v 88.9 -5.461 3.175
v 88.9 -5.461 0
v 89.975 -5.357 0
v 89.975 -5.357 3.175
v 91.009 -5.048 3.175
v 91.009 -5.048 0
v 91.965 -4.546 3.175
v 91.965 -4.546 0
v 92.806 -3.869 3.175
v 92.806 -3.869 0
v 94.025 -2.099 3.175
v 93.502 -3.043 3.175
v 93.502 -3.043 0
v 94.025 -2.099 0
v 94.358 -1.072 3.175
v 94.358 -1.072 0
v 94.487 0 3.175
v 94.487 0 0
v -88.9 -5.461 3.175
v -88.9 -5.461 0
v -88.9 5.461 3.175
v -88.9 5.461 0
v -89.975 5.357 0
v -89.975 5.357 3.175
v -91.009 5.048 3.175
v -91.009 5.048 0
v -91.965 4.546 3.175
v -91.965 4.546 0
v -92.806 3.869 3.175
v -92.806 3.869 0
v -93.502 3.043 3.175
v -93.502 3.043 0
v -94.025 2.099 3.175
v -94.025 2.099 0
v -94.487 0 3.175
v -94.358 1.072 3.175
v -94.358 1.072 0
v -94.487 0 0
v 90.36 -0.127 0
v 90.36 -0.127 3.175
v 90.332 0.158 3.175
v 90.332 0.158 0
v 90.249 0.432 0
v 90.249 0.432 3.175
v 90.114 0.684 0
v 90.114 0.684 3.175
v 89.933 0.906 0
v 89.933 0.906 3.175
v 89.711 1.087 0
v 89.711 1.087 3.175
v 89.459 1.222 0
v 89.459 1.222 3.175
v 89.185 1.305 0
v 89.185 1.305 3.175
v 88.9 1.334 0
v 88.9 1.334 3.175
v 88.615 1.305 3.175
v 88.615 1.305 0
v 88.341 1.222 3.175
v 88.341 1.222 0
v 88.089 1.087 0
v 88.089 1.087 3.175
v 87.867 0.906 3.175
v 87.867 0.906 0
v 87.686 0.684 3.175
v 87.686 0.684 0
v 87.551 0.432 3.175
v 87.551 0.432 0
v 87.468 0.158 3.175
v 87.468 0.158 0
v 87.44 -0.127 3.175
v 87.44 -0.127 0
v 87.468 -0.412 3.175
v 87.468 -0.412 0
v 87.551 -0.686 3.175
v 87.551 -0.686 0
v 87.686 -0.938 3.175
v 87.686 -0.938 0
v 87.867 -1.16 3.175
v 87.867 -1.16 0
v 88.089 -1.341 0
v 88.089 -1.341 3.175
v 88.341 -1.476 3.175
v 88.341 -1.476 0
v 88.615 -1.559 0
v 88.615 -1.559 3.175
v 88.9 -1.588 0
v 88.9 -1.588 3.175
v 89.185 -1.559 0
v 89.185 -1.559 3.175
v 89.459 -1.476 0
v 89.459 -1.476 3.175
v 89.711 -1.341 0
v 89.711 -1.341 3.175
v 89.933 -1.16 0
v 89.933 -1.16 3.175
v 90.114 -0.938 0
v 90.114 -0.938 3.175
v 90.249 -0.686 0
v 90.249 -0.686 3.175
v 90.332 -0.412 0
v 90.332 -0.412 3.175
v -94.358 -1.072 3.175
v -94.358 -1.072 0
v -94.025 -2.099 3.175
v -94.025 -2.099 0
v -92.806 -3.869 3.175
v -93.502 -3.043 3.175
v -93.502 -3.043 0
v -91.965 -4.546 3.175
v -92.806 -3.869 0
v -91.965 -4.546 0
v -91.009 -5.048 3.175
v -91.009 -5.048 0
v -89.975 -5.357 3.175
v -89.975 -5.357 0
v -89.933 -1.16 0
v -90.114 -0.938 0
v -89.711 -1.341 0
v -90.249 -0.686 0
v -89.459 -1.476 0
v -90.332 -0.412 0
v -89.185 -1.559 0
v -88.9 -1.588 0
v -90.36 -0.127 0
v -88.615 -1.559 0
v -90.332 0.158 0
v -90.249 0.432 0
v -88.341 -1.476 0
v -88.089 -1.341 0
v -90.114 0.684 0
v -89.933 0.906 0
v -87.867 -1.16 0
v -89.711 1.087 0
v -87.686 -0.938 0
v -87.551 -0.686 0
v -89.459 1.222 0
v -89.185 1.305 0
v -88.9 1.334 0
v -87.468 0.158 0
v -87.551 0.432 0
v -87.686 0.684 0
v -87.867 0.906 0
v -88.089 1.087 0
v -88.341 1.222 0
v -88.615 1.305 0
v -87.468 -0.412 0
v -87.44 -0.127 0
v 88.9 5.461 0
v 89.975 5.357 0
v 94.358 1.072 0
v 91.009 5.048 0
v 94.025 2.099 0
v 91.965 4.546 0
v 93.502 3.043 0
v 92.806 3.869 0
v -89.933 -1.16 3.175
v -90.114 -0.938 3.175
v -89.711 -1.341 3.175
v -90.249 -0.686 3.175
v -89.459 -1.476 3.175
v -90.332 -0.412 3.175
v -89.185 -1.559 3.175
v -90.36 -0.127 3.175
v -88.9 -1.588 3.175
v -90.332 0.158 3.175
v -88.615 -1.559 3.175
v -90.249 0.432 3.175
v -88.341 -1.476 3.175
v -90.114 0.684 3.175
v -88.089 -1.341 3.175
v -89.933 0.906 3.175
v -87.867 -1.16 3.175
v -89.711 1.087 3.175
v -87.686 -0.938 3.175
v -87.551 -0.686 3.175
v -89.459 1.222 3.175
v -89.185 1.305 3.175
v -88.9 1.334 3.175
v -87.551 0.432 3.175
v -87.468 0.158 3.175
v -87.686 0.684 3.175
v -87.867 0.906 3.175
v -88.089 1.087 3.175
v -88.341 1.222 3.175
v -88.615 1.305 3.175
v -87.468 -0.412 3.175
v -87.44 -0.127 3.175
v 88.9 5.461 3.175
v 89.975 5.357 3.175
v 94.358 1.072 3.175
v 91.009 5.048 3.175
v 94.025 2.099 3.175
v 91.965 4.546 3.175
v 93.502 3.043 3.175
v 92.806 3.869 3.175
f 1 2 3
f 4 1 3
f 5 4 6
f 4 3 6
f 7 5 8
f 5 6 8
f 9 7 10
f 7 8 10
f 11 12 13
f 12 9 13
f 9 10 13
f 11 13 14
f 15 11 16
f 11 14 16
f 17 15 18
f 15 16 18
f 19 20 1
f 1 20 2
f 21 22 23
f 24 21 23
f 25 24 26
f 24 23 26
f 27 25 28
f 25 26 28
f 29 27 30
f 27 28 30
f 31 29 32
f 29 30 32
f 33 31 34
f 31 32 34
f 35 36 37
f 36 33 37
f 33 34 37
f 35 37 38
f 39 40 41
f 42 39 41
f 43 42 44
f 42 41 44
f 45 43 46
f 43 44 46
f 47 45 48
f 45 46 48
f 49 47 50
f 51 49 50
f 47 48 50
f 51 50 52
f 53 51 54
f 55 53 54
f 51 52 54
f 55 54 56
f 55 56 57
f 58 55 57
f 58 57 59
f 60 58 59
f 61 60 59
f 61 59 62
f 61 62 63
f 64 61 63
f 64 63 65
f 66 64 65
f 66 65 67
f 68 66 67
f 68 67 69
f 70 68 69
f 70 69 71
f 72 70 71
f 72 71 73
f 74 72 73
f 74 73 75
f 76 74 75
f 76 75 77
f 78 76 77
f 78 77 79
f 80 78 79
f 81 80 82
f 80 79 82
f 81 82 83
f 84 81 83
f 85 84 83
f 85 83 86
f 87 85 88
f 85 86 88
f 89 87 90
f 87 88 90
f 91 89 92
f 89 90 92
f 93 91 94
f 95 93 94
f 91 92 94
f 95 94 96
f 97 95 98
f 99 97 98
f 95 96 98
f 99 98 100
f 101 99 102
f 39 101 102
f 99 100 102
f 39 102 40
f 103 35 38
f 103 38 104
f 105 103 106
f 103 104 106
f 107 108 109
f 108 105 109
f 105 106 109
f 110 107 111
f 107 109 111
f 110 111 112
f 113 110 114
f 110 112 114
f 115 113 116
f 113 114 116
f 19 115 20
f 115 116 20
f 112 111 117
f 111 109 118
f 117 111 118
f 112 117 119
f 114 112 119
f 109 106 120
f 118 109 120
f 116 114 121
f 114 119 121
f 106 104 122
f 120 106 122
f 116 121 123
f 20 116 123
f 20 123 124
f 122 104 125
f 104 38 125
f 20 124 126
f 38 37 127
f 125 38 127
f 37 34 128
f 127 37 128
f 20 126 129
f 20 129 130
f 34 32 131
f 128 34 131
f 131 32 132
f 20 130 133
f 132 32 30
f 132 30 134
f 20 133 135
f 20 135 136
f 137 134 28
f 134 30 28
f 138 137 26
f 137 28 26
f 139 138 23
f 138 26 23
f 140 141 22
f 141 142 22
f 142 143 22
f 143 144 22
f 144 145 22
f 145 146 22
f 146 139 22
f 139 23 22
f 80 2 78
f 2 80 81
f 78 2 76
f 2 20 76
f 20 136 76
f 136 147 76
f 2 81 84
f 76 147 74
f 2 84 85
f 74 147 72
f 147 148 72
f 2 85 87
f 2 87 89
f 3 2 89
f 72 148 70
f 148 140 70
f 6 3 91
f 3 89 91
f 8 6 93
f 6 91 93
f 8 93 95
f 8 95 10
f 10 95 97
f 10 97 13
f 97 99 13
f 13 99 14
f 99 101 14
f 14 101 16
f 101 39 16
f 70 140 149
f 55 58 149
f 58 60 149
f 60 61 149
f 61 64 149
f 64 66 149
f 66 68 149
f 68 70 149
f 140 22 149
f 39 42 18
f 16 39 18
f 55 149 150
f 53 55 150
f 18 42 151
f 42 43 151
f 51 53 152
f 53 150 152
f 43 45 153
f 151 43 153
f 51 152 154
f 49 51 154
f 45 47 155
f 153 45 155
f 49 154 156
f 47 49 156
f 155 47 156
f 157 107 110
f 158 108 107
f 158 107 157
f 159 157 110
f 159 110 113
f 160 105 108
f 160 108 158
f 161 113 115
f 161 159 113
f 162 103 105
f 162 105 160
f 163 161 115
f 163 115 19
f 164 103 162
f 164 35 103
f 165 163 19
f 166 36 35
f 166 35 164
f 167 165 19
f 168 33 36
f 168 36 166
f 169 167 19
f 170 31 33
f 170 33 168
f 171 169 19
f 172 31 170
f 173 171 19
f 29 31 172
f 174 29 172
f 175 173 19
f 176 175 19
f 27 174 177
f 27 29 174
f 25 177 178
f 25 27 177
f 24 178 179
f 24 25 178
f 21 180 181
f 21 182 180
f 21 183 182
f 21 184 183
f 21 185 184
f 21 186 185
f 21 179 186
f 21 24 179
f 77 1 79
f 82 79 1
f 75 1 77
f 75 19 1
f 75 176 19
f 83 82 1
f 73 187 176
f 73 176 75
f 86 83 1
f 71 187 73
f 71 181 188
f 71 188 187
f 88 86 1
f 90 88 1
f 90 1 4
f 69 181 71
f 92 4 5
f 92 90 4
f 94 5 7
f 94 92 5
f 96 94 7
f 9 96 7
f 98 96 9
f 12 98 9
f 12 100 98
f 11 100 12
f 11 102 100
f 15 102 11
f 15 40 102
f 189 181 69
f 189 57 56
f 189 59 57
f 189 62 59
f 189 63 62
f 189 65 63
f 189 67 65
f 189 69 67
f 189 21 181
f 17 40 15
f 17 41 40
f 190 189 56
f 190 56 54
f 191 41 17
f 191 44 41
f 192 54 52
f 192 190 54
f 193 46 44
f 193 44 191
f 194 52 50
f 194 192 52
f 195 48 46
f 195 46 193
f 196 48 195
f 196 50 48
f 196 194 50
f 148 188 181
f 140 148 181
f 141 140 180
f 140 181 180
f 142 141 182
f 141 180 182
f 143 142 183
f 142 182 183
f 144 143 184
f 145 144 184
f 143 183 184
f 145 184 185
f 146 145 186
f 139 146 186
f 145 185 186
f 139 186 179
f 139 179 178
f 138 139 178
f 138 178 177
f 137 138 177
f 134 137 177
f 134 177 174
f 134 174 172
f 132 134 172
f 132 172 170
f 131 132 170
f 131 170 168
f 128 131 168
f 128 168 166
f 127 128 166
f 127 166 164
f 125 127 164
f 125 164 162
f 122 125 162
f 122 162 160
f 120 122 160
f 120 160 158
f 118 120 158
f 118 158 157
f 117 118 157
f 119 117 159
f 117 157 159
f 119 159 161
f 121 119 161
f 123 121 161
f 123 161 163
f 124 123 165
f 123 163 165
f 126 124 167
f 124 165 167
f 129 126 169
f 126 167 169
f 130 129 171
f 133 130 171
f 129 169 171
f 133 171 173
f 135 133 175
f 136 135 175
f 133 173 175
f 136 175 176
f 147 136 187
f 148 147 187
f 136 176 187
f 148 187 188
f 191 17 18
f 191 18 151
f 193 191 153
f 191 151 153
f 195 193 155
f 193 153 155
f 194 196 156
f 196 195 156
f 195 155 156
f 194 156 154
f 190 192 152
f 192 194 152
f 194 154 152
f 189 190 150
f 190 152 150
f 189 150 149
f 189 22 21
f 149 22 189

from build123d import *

# Parameters (mm, degrees)
SKETCH1_W           = 188.976
SKETCH1_H           = 10.922
BOSS_EXTRUDE1_DEPTH = 3.175
FILLET1_R           = 5.588
SKETCH2_R           = 1.4605
CUT_EXTRUDE1_DEPTH  = 95.697479006


with BuildPart() as part:
    # Sketch1 → Boss-Extrude1 (new body)
    with BuildSketch(Plane.XY):
        Rectangle(SKETCH1_W, SKETCH1_H)
    extrude(amount=BOSS_EXTRUDE1_DEPTH)

    # Fillet1
    # the kernel refuses this fillet: 5.588 mm, written as the material it takes off along each edge
    with BuildSketch(Plane(origin=(-94.488, -5.461, -13.97), x_dir=(1, 0, 0), z_dir=(0, 0, 1))) as fillet1_piece_1:
        with BuildLine():
            CenterArc((FILLET1_R, FILLET1_R), FILLET1_R, 180, 90)
            Line((0, FILLET1_R), (0, 0))
            Line((0, 0), (FILLET1_R, 0))
        make_face()
    extrude(amount=31.115, mode=Mode.SUBTRACT)
    with BuildSketch(Plane(origin=(-94.488, 5.461, -13.97), x_dir=(1, 0, 0), z_dir=(0, 0, 1)), Plane(origin=(94.488, -5.461, -13.97), x_dir=(-1, 0, 0), z_dir=(0, 0, 1)), Plane(origin=(94.488, 5.461, -13.97), x_dir=(0, -1, 0), z_dir=(0, 0, 1))) as fillet1_piece_2:
        with BuildLine():
            CenterArc((FILLET1_R, -FILLET1_R), FILLET1_R, 90, 90)
            Line((0, -FILLET1_R), (0, 0))
            Line((0, 0), (FILLET1_R, 0))
        make_face()
    extrude(amount=31.115, mode=Mode.SUBTRACT)

    # Sketch2 → Cut-Extrude1 (cut, through all)
    with BuildSketch(Plane.XY.offset(3.175)):
        with Locations((-88.9, -0.127)):
            Circle(SKETCH2_R)
        with Locations((88.9, -0.127)):
            Circle(SKETCH2_R)
    extrude(amount=-CUT_EXTRUDE1_DEPTH, mode=Mode.SUBTRACT)


solid = part.part
